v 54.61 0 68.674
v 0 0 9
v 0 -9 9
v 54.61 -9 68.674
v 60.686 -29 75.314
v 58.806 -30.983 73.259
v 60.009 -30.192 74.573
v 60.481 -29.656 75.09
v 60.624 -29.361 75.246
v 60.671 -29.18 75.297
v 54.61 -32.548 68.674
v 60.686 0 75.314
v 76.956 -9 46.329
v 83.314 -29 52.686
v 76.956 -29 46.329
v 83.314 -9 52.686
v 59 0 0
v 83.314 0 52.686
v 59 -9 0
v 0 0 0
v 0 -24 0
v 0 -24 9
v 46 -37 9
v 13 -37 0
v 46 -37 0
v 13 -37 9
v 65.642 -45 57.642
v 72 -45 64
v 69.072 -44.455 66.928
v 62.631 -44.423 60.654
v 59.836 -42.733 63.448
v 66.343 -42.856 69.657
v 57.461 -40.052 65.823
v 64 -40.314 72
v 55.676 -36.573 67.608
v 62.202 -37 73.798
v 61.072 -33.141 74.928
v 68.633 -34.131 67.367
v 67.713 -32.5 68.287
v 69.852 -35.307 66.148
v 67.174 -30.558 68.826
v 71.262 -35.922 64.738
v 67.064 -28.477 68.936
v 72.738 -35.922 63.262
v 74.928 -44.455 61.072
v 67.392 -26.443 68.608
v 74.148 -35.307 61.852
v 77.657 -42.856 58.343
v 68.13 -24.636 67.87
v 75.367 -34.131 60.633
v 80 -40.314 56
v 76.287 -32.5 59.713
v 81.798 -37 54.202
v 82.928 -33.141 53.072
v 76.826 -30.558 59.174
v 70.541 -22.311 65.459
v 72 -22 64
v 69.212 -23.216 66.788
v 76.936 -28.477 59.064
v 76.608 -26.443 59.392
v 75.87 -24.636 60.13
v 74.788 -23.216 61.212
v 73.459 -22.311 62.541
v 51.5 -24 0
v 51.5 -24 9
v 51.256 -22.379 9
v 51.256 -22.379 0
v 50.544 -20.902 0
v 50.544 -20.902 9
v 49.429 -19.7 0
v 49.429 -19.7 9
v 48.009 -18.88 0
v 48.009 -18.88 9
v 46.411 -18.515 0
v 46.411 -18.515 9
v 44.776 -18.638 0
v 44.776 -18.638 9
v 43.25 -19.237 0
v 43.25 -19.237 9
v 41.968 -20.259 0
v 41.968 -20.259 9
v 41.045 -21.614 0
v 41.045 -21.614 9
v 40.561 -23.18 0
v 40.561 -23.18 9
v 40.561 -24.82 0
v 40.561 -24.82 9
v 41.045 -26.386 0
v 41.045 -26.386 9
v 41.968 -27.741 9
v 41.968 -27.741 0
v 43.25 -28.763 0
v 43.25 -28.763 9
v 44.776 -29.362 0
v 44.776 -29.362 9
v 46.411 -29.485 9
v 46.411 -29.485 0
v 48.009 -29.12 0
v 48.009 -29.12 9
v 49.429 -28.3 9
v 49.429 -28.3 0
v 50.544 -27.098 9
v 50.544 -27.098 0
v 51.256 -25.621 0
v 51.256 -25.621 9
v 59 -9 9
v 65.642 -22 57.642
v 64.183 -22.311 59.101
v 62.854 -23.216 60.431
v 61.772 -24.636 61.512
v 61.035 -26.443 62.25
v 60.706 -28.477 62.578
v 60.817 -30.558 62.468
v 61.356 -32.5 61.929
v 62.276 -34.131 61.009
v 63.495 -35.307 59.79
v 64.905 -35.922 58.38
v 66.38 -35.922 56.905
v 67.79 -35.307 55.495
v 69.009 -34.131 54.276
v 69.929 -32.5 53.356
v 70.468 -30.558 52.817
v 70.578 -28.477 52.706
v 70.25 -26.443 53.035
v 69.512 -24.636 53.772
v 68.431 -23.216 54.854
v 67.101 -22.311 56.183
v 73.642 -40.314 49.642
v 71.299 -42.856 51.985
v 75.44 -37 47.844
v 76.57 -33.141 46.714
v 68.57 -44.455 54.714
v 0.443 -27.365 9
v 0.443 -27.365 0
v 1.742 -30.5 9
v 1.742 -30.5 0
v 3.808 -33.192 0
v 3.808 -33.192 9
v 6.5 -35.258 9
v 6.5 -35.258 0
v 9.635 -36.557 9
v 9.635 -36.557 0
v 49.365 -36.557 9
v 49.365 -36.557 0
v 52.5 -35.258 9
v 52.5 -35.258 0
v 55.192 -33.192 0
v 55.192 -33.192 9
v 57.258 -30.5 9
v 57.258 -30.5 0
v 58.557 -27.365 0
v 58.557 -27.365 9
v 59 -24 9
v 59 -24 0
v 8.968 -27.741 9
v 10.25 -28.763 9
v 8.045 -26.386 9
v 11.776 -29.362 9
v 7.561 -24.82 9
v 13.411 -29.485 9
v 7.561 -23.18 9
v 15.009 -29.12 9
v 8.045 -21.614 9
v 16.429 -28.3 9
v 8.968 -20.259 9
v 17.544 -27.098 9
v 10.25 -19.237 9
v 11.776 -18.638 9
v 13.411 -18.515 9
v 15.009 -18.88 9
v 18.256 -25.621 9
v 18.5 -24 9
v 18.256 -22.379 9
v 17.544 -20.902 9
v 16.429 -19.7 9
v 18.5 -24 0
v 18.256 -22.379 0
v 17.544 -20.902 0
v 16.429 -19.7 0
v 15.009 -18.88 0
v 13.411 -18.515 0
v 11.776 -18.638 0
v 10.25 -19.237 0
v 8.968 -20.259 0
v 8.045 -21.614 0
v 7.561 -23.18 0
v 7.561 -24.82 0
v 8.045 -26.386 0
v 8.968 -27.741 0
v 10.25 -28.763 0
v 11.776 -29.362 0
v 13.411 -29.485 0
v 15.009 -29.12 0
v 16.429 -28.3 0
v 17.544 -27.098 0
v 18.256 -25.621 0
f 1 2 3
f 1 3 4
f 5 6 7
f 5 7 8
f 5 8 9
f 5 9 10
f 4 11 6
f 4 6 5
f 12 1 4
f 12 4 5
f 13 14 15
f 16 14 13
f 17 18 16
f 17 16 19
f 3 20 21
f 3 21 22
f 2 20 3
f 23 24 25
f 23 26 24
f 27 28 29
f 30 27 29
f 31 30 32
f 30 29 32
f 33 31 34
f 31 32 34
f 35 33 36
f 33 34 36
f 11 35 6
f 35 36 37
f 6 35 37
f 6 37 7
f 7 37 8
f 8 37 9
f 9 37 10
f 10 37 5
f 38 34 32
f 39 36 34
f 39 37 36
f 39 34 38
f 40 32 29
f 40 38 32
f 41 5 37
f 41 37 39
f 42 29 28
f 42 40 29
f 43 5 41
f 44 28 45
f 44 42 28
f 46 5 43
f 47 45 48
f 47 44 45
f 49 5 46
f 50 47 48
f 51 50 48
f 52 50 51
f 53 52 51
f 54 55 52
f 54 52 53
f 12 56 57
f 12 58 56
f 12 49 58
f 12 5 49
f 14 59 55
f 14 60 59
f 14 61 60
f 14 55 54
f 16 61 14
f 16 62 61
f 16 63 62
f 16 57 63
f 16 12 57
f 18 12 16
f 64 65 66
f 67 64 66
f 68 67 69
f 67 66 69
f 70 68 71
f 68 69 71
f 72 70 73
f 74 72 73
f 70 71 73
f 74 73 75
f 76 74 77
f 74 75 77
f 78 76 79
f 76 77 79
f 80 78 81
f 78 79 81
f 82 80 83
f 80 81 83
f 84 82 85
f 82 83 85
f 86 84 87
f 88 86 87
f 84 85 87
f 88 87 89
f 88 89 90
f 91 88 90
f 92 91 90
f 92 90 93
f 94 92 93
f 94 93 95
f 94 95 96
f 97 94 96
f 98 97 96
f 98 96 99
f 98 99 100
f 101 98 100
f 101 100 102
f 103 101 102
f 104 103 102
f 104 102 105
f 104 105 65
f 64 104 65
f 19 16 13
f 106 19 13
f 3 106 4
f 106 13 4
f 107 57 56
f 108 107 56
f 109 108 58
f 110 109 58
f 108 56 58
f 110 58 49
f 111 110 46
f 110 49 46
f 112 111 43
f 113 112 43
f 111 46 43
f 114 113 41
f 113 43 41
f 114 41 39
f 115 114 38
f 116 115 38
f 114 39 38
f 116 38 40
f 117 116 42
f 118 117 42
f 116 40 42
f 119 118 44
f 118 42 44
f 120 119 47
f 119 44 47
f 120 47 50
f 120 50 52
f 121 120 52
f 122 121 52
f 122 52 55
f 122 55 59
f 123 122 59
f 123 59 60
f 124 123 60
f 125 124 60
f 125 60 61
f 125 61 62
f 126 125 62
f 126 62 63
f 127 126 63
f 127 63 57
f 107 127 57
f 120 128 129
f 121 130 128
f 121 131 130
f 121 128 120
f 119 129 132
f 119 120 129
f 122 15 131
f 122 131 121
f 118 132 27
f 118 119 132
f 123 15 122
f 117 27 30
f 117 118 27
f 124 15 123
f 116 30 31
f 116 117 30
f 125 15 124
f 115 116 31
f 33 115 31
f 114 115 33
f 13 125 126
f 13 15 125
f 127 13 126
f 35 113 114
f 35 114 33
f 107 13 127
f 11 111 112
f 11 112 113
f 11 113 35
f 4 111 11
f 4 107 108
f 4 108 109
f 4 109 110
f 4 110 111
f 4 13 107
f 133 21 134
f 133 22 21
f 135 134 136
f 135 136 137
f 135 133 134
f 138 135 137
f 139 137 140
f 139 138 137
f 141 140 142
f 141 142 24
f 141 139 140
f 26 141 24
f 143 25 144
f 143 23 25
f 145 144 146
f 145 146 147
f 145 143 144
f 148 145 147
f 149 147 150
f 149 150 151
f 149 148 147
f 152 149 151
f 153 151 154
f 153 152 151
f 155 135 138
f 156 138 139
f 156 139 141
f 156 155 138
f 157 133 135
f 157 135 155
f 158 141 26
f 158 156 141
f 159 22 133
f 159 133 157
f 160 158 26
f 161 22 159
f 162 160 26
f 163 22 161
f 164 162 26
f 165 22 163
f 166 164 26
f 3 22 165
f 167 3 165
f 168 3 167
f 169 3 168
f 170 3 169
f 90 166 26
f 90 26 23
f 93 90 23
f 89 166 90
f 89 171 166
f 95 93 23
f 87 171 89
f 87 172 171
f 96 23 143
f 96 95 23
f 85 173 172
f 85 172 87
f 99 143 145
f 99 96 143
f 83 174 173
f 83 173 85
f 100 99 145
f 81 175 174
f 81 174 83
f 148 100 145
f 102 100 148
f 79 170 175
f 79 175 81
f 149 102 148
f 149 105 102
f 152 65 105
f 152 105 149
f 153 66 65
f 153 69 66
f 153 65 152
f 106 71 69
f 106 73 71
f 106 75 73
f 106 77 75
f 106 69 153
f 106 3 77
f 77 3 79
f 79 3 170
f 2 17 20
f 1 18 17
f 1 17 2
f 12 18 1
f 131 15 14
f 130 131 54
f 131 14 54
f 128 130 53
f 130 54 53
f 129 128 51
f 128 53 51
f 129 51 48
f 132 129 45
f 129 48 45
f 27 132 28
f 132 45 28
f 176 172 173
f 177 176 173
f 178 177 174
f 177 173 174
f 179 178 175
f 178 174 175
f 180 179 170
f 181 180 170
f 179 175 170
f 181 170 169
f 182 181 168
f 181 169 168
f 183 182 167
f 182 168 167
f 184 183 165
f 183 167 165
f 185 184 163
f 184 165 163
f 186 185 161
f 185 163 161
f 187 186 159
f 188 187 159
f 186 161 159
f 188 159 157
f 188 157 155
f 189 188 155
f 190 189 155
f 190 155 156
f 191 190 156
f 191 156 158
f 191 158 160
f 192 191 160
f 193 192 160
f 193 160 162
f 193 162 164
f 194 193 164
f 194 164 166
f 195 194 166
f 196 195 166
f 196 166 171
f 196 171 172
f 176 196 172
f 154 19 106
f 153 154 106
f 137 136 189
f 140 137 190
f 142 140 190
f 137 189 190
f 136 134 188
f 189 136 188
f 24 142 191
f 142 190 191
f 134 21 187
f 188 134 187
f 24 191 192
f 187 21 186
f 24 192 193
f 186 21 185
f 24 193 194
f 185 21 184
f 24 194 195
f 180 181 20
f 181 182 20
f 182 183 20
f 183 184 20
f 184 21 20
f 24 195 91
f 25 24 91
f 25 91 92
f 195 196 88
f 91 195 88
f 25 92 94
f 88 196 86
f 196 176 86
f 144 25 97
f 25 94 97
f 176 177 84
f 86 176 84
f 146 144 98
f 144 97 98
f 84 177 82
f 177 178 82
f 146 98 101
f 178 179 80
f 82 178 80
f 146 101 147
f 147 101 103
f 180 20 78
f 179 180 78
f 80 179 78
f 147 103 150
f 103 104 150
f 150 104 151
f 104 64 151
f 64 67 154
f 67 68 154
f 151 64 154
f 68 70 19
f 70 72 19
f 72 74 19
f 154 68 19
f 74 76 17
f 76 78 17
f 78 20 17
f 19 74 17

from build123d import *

# Parameters (mm, degrees)
F0_W       = 59
F0_H       = 9
F1_DEPTH   = 37
F2_R       = 5.5
F3_DEPTH   = 25
F5_DEPTH   = 9
F6_DEPTH   = 45
F7_R       = 7
F6_FACE1_W = 36
F6_FACE1_H = 9
F8_DEPTH   = 25
F9_R       = 13


with BuildPart() as f1:
    # F0 (on Front) → F1 (new body)
    with BuildSketch(Plane.XZ):
        with Locations((29.5, 4.5)):
            Rectangle(F0_W, F0_H)
    extrude(amount=F1_DEPTH)

    # F2 (on face) → F3 (cut)
    with BuildSketch(Plane.XY.offset(9)):
        with Locations((46, -24)):
            Circle(F2_R)
        with Locations((13, -24)):
            Circle(F2_R)
    extrude(amount=-F3_DEPTH, mode=Mode.SUBTRACT)

    # F4 (on face) → F5 (join)
    with BuildSketch(Plane(origin=(0, 0, 0), x_dir=(-1, 0, 0), z_dir=(0, 1, 0))):
        Polygon((-77.2376988573, 46.0468557694), (-83.313708499, 52.686291501), (-59, 0), (-59, 9), (0, 9), (-54.6102818594, 68.6742727673), align=None)
    extrude(amount=-F5_DEPTH)

    # F4 (on face) → F6 (join)
    with BuildSketch(Plane(origin=(0, 0, 0), x_dir=(-1, 0, 0), z_dir=(0, 1, 0))):
        Polygon((-60.686291501, 75.313708499), (-72, 64), (-83.313708499, 52.686291501), (-77.2376988573, 46.0468557694), (-54.6102818594, 68.6742727673), align=None)
    extrude(amount=-F6_DEPTH)

    # F7 (on face) + F6_face1 (on face) → F8 (cut)
    with BuildSketch(Plane(origin=(68, 0, 68), x_dir=(0, 1, 0), z_dir=(0.7071067812, 0, 0.7071067812))):
        with Locations((-29, -5.6568542495)):
            Circle(F7_R)
        with BuildLine():
            ThreePointArc((-45, -5.6568542495), (-40.313708499, 5.6568542495), (-29, 10.3431457505))
            Line((-29, 10.3431457505), (-45, 10.3431457505))
            Line((-45, 10.3431457505), (-45, -5.6568542495))
        make_face()
        with BuildLine():
            ThreePointArc((-29, -21.6568542495), (-40.313708499, -16.9705627485), (-45, -5.6568542495))
            Line((-45, -5.6568542495), (-45, -21.6568542495))
            Line((-45, -21.6568542495), (-29, -21.6568542495))
        make_face()
    with BuildSketch(Plane(origin=(80.2757036782, -27, 49.3665736352), x_dir=(0, 1, 0), z_dir=(0.7377150813, 0, -0.6751121824))):
        Rectangle(F6_FACE1_W, F6_FACE1_H)
    extrude(amount=-F8_DEPTH, dir=(0.7071067812, 0, 0.7071067812), mode=Mode.SUBTRACT)

    # F9
    f9_edges = [f1.edges().sort_by_distance(p)[0] for p in [
        (59, -37, 4.5),
        (0, -37, 4.5),
    ]]
    fillet(f9_edges, radius=F9_R)


solid = f1.part
